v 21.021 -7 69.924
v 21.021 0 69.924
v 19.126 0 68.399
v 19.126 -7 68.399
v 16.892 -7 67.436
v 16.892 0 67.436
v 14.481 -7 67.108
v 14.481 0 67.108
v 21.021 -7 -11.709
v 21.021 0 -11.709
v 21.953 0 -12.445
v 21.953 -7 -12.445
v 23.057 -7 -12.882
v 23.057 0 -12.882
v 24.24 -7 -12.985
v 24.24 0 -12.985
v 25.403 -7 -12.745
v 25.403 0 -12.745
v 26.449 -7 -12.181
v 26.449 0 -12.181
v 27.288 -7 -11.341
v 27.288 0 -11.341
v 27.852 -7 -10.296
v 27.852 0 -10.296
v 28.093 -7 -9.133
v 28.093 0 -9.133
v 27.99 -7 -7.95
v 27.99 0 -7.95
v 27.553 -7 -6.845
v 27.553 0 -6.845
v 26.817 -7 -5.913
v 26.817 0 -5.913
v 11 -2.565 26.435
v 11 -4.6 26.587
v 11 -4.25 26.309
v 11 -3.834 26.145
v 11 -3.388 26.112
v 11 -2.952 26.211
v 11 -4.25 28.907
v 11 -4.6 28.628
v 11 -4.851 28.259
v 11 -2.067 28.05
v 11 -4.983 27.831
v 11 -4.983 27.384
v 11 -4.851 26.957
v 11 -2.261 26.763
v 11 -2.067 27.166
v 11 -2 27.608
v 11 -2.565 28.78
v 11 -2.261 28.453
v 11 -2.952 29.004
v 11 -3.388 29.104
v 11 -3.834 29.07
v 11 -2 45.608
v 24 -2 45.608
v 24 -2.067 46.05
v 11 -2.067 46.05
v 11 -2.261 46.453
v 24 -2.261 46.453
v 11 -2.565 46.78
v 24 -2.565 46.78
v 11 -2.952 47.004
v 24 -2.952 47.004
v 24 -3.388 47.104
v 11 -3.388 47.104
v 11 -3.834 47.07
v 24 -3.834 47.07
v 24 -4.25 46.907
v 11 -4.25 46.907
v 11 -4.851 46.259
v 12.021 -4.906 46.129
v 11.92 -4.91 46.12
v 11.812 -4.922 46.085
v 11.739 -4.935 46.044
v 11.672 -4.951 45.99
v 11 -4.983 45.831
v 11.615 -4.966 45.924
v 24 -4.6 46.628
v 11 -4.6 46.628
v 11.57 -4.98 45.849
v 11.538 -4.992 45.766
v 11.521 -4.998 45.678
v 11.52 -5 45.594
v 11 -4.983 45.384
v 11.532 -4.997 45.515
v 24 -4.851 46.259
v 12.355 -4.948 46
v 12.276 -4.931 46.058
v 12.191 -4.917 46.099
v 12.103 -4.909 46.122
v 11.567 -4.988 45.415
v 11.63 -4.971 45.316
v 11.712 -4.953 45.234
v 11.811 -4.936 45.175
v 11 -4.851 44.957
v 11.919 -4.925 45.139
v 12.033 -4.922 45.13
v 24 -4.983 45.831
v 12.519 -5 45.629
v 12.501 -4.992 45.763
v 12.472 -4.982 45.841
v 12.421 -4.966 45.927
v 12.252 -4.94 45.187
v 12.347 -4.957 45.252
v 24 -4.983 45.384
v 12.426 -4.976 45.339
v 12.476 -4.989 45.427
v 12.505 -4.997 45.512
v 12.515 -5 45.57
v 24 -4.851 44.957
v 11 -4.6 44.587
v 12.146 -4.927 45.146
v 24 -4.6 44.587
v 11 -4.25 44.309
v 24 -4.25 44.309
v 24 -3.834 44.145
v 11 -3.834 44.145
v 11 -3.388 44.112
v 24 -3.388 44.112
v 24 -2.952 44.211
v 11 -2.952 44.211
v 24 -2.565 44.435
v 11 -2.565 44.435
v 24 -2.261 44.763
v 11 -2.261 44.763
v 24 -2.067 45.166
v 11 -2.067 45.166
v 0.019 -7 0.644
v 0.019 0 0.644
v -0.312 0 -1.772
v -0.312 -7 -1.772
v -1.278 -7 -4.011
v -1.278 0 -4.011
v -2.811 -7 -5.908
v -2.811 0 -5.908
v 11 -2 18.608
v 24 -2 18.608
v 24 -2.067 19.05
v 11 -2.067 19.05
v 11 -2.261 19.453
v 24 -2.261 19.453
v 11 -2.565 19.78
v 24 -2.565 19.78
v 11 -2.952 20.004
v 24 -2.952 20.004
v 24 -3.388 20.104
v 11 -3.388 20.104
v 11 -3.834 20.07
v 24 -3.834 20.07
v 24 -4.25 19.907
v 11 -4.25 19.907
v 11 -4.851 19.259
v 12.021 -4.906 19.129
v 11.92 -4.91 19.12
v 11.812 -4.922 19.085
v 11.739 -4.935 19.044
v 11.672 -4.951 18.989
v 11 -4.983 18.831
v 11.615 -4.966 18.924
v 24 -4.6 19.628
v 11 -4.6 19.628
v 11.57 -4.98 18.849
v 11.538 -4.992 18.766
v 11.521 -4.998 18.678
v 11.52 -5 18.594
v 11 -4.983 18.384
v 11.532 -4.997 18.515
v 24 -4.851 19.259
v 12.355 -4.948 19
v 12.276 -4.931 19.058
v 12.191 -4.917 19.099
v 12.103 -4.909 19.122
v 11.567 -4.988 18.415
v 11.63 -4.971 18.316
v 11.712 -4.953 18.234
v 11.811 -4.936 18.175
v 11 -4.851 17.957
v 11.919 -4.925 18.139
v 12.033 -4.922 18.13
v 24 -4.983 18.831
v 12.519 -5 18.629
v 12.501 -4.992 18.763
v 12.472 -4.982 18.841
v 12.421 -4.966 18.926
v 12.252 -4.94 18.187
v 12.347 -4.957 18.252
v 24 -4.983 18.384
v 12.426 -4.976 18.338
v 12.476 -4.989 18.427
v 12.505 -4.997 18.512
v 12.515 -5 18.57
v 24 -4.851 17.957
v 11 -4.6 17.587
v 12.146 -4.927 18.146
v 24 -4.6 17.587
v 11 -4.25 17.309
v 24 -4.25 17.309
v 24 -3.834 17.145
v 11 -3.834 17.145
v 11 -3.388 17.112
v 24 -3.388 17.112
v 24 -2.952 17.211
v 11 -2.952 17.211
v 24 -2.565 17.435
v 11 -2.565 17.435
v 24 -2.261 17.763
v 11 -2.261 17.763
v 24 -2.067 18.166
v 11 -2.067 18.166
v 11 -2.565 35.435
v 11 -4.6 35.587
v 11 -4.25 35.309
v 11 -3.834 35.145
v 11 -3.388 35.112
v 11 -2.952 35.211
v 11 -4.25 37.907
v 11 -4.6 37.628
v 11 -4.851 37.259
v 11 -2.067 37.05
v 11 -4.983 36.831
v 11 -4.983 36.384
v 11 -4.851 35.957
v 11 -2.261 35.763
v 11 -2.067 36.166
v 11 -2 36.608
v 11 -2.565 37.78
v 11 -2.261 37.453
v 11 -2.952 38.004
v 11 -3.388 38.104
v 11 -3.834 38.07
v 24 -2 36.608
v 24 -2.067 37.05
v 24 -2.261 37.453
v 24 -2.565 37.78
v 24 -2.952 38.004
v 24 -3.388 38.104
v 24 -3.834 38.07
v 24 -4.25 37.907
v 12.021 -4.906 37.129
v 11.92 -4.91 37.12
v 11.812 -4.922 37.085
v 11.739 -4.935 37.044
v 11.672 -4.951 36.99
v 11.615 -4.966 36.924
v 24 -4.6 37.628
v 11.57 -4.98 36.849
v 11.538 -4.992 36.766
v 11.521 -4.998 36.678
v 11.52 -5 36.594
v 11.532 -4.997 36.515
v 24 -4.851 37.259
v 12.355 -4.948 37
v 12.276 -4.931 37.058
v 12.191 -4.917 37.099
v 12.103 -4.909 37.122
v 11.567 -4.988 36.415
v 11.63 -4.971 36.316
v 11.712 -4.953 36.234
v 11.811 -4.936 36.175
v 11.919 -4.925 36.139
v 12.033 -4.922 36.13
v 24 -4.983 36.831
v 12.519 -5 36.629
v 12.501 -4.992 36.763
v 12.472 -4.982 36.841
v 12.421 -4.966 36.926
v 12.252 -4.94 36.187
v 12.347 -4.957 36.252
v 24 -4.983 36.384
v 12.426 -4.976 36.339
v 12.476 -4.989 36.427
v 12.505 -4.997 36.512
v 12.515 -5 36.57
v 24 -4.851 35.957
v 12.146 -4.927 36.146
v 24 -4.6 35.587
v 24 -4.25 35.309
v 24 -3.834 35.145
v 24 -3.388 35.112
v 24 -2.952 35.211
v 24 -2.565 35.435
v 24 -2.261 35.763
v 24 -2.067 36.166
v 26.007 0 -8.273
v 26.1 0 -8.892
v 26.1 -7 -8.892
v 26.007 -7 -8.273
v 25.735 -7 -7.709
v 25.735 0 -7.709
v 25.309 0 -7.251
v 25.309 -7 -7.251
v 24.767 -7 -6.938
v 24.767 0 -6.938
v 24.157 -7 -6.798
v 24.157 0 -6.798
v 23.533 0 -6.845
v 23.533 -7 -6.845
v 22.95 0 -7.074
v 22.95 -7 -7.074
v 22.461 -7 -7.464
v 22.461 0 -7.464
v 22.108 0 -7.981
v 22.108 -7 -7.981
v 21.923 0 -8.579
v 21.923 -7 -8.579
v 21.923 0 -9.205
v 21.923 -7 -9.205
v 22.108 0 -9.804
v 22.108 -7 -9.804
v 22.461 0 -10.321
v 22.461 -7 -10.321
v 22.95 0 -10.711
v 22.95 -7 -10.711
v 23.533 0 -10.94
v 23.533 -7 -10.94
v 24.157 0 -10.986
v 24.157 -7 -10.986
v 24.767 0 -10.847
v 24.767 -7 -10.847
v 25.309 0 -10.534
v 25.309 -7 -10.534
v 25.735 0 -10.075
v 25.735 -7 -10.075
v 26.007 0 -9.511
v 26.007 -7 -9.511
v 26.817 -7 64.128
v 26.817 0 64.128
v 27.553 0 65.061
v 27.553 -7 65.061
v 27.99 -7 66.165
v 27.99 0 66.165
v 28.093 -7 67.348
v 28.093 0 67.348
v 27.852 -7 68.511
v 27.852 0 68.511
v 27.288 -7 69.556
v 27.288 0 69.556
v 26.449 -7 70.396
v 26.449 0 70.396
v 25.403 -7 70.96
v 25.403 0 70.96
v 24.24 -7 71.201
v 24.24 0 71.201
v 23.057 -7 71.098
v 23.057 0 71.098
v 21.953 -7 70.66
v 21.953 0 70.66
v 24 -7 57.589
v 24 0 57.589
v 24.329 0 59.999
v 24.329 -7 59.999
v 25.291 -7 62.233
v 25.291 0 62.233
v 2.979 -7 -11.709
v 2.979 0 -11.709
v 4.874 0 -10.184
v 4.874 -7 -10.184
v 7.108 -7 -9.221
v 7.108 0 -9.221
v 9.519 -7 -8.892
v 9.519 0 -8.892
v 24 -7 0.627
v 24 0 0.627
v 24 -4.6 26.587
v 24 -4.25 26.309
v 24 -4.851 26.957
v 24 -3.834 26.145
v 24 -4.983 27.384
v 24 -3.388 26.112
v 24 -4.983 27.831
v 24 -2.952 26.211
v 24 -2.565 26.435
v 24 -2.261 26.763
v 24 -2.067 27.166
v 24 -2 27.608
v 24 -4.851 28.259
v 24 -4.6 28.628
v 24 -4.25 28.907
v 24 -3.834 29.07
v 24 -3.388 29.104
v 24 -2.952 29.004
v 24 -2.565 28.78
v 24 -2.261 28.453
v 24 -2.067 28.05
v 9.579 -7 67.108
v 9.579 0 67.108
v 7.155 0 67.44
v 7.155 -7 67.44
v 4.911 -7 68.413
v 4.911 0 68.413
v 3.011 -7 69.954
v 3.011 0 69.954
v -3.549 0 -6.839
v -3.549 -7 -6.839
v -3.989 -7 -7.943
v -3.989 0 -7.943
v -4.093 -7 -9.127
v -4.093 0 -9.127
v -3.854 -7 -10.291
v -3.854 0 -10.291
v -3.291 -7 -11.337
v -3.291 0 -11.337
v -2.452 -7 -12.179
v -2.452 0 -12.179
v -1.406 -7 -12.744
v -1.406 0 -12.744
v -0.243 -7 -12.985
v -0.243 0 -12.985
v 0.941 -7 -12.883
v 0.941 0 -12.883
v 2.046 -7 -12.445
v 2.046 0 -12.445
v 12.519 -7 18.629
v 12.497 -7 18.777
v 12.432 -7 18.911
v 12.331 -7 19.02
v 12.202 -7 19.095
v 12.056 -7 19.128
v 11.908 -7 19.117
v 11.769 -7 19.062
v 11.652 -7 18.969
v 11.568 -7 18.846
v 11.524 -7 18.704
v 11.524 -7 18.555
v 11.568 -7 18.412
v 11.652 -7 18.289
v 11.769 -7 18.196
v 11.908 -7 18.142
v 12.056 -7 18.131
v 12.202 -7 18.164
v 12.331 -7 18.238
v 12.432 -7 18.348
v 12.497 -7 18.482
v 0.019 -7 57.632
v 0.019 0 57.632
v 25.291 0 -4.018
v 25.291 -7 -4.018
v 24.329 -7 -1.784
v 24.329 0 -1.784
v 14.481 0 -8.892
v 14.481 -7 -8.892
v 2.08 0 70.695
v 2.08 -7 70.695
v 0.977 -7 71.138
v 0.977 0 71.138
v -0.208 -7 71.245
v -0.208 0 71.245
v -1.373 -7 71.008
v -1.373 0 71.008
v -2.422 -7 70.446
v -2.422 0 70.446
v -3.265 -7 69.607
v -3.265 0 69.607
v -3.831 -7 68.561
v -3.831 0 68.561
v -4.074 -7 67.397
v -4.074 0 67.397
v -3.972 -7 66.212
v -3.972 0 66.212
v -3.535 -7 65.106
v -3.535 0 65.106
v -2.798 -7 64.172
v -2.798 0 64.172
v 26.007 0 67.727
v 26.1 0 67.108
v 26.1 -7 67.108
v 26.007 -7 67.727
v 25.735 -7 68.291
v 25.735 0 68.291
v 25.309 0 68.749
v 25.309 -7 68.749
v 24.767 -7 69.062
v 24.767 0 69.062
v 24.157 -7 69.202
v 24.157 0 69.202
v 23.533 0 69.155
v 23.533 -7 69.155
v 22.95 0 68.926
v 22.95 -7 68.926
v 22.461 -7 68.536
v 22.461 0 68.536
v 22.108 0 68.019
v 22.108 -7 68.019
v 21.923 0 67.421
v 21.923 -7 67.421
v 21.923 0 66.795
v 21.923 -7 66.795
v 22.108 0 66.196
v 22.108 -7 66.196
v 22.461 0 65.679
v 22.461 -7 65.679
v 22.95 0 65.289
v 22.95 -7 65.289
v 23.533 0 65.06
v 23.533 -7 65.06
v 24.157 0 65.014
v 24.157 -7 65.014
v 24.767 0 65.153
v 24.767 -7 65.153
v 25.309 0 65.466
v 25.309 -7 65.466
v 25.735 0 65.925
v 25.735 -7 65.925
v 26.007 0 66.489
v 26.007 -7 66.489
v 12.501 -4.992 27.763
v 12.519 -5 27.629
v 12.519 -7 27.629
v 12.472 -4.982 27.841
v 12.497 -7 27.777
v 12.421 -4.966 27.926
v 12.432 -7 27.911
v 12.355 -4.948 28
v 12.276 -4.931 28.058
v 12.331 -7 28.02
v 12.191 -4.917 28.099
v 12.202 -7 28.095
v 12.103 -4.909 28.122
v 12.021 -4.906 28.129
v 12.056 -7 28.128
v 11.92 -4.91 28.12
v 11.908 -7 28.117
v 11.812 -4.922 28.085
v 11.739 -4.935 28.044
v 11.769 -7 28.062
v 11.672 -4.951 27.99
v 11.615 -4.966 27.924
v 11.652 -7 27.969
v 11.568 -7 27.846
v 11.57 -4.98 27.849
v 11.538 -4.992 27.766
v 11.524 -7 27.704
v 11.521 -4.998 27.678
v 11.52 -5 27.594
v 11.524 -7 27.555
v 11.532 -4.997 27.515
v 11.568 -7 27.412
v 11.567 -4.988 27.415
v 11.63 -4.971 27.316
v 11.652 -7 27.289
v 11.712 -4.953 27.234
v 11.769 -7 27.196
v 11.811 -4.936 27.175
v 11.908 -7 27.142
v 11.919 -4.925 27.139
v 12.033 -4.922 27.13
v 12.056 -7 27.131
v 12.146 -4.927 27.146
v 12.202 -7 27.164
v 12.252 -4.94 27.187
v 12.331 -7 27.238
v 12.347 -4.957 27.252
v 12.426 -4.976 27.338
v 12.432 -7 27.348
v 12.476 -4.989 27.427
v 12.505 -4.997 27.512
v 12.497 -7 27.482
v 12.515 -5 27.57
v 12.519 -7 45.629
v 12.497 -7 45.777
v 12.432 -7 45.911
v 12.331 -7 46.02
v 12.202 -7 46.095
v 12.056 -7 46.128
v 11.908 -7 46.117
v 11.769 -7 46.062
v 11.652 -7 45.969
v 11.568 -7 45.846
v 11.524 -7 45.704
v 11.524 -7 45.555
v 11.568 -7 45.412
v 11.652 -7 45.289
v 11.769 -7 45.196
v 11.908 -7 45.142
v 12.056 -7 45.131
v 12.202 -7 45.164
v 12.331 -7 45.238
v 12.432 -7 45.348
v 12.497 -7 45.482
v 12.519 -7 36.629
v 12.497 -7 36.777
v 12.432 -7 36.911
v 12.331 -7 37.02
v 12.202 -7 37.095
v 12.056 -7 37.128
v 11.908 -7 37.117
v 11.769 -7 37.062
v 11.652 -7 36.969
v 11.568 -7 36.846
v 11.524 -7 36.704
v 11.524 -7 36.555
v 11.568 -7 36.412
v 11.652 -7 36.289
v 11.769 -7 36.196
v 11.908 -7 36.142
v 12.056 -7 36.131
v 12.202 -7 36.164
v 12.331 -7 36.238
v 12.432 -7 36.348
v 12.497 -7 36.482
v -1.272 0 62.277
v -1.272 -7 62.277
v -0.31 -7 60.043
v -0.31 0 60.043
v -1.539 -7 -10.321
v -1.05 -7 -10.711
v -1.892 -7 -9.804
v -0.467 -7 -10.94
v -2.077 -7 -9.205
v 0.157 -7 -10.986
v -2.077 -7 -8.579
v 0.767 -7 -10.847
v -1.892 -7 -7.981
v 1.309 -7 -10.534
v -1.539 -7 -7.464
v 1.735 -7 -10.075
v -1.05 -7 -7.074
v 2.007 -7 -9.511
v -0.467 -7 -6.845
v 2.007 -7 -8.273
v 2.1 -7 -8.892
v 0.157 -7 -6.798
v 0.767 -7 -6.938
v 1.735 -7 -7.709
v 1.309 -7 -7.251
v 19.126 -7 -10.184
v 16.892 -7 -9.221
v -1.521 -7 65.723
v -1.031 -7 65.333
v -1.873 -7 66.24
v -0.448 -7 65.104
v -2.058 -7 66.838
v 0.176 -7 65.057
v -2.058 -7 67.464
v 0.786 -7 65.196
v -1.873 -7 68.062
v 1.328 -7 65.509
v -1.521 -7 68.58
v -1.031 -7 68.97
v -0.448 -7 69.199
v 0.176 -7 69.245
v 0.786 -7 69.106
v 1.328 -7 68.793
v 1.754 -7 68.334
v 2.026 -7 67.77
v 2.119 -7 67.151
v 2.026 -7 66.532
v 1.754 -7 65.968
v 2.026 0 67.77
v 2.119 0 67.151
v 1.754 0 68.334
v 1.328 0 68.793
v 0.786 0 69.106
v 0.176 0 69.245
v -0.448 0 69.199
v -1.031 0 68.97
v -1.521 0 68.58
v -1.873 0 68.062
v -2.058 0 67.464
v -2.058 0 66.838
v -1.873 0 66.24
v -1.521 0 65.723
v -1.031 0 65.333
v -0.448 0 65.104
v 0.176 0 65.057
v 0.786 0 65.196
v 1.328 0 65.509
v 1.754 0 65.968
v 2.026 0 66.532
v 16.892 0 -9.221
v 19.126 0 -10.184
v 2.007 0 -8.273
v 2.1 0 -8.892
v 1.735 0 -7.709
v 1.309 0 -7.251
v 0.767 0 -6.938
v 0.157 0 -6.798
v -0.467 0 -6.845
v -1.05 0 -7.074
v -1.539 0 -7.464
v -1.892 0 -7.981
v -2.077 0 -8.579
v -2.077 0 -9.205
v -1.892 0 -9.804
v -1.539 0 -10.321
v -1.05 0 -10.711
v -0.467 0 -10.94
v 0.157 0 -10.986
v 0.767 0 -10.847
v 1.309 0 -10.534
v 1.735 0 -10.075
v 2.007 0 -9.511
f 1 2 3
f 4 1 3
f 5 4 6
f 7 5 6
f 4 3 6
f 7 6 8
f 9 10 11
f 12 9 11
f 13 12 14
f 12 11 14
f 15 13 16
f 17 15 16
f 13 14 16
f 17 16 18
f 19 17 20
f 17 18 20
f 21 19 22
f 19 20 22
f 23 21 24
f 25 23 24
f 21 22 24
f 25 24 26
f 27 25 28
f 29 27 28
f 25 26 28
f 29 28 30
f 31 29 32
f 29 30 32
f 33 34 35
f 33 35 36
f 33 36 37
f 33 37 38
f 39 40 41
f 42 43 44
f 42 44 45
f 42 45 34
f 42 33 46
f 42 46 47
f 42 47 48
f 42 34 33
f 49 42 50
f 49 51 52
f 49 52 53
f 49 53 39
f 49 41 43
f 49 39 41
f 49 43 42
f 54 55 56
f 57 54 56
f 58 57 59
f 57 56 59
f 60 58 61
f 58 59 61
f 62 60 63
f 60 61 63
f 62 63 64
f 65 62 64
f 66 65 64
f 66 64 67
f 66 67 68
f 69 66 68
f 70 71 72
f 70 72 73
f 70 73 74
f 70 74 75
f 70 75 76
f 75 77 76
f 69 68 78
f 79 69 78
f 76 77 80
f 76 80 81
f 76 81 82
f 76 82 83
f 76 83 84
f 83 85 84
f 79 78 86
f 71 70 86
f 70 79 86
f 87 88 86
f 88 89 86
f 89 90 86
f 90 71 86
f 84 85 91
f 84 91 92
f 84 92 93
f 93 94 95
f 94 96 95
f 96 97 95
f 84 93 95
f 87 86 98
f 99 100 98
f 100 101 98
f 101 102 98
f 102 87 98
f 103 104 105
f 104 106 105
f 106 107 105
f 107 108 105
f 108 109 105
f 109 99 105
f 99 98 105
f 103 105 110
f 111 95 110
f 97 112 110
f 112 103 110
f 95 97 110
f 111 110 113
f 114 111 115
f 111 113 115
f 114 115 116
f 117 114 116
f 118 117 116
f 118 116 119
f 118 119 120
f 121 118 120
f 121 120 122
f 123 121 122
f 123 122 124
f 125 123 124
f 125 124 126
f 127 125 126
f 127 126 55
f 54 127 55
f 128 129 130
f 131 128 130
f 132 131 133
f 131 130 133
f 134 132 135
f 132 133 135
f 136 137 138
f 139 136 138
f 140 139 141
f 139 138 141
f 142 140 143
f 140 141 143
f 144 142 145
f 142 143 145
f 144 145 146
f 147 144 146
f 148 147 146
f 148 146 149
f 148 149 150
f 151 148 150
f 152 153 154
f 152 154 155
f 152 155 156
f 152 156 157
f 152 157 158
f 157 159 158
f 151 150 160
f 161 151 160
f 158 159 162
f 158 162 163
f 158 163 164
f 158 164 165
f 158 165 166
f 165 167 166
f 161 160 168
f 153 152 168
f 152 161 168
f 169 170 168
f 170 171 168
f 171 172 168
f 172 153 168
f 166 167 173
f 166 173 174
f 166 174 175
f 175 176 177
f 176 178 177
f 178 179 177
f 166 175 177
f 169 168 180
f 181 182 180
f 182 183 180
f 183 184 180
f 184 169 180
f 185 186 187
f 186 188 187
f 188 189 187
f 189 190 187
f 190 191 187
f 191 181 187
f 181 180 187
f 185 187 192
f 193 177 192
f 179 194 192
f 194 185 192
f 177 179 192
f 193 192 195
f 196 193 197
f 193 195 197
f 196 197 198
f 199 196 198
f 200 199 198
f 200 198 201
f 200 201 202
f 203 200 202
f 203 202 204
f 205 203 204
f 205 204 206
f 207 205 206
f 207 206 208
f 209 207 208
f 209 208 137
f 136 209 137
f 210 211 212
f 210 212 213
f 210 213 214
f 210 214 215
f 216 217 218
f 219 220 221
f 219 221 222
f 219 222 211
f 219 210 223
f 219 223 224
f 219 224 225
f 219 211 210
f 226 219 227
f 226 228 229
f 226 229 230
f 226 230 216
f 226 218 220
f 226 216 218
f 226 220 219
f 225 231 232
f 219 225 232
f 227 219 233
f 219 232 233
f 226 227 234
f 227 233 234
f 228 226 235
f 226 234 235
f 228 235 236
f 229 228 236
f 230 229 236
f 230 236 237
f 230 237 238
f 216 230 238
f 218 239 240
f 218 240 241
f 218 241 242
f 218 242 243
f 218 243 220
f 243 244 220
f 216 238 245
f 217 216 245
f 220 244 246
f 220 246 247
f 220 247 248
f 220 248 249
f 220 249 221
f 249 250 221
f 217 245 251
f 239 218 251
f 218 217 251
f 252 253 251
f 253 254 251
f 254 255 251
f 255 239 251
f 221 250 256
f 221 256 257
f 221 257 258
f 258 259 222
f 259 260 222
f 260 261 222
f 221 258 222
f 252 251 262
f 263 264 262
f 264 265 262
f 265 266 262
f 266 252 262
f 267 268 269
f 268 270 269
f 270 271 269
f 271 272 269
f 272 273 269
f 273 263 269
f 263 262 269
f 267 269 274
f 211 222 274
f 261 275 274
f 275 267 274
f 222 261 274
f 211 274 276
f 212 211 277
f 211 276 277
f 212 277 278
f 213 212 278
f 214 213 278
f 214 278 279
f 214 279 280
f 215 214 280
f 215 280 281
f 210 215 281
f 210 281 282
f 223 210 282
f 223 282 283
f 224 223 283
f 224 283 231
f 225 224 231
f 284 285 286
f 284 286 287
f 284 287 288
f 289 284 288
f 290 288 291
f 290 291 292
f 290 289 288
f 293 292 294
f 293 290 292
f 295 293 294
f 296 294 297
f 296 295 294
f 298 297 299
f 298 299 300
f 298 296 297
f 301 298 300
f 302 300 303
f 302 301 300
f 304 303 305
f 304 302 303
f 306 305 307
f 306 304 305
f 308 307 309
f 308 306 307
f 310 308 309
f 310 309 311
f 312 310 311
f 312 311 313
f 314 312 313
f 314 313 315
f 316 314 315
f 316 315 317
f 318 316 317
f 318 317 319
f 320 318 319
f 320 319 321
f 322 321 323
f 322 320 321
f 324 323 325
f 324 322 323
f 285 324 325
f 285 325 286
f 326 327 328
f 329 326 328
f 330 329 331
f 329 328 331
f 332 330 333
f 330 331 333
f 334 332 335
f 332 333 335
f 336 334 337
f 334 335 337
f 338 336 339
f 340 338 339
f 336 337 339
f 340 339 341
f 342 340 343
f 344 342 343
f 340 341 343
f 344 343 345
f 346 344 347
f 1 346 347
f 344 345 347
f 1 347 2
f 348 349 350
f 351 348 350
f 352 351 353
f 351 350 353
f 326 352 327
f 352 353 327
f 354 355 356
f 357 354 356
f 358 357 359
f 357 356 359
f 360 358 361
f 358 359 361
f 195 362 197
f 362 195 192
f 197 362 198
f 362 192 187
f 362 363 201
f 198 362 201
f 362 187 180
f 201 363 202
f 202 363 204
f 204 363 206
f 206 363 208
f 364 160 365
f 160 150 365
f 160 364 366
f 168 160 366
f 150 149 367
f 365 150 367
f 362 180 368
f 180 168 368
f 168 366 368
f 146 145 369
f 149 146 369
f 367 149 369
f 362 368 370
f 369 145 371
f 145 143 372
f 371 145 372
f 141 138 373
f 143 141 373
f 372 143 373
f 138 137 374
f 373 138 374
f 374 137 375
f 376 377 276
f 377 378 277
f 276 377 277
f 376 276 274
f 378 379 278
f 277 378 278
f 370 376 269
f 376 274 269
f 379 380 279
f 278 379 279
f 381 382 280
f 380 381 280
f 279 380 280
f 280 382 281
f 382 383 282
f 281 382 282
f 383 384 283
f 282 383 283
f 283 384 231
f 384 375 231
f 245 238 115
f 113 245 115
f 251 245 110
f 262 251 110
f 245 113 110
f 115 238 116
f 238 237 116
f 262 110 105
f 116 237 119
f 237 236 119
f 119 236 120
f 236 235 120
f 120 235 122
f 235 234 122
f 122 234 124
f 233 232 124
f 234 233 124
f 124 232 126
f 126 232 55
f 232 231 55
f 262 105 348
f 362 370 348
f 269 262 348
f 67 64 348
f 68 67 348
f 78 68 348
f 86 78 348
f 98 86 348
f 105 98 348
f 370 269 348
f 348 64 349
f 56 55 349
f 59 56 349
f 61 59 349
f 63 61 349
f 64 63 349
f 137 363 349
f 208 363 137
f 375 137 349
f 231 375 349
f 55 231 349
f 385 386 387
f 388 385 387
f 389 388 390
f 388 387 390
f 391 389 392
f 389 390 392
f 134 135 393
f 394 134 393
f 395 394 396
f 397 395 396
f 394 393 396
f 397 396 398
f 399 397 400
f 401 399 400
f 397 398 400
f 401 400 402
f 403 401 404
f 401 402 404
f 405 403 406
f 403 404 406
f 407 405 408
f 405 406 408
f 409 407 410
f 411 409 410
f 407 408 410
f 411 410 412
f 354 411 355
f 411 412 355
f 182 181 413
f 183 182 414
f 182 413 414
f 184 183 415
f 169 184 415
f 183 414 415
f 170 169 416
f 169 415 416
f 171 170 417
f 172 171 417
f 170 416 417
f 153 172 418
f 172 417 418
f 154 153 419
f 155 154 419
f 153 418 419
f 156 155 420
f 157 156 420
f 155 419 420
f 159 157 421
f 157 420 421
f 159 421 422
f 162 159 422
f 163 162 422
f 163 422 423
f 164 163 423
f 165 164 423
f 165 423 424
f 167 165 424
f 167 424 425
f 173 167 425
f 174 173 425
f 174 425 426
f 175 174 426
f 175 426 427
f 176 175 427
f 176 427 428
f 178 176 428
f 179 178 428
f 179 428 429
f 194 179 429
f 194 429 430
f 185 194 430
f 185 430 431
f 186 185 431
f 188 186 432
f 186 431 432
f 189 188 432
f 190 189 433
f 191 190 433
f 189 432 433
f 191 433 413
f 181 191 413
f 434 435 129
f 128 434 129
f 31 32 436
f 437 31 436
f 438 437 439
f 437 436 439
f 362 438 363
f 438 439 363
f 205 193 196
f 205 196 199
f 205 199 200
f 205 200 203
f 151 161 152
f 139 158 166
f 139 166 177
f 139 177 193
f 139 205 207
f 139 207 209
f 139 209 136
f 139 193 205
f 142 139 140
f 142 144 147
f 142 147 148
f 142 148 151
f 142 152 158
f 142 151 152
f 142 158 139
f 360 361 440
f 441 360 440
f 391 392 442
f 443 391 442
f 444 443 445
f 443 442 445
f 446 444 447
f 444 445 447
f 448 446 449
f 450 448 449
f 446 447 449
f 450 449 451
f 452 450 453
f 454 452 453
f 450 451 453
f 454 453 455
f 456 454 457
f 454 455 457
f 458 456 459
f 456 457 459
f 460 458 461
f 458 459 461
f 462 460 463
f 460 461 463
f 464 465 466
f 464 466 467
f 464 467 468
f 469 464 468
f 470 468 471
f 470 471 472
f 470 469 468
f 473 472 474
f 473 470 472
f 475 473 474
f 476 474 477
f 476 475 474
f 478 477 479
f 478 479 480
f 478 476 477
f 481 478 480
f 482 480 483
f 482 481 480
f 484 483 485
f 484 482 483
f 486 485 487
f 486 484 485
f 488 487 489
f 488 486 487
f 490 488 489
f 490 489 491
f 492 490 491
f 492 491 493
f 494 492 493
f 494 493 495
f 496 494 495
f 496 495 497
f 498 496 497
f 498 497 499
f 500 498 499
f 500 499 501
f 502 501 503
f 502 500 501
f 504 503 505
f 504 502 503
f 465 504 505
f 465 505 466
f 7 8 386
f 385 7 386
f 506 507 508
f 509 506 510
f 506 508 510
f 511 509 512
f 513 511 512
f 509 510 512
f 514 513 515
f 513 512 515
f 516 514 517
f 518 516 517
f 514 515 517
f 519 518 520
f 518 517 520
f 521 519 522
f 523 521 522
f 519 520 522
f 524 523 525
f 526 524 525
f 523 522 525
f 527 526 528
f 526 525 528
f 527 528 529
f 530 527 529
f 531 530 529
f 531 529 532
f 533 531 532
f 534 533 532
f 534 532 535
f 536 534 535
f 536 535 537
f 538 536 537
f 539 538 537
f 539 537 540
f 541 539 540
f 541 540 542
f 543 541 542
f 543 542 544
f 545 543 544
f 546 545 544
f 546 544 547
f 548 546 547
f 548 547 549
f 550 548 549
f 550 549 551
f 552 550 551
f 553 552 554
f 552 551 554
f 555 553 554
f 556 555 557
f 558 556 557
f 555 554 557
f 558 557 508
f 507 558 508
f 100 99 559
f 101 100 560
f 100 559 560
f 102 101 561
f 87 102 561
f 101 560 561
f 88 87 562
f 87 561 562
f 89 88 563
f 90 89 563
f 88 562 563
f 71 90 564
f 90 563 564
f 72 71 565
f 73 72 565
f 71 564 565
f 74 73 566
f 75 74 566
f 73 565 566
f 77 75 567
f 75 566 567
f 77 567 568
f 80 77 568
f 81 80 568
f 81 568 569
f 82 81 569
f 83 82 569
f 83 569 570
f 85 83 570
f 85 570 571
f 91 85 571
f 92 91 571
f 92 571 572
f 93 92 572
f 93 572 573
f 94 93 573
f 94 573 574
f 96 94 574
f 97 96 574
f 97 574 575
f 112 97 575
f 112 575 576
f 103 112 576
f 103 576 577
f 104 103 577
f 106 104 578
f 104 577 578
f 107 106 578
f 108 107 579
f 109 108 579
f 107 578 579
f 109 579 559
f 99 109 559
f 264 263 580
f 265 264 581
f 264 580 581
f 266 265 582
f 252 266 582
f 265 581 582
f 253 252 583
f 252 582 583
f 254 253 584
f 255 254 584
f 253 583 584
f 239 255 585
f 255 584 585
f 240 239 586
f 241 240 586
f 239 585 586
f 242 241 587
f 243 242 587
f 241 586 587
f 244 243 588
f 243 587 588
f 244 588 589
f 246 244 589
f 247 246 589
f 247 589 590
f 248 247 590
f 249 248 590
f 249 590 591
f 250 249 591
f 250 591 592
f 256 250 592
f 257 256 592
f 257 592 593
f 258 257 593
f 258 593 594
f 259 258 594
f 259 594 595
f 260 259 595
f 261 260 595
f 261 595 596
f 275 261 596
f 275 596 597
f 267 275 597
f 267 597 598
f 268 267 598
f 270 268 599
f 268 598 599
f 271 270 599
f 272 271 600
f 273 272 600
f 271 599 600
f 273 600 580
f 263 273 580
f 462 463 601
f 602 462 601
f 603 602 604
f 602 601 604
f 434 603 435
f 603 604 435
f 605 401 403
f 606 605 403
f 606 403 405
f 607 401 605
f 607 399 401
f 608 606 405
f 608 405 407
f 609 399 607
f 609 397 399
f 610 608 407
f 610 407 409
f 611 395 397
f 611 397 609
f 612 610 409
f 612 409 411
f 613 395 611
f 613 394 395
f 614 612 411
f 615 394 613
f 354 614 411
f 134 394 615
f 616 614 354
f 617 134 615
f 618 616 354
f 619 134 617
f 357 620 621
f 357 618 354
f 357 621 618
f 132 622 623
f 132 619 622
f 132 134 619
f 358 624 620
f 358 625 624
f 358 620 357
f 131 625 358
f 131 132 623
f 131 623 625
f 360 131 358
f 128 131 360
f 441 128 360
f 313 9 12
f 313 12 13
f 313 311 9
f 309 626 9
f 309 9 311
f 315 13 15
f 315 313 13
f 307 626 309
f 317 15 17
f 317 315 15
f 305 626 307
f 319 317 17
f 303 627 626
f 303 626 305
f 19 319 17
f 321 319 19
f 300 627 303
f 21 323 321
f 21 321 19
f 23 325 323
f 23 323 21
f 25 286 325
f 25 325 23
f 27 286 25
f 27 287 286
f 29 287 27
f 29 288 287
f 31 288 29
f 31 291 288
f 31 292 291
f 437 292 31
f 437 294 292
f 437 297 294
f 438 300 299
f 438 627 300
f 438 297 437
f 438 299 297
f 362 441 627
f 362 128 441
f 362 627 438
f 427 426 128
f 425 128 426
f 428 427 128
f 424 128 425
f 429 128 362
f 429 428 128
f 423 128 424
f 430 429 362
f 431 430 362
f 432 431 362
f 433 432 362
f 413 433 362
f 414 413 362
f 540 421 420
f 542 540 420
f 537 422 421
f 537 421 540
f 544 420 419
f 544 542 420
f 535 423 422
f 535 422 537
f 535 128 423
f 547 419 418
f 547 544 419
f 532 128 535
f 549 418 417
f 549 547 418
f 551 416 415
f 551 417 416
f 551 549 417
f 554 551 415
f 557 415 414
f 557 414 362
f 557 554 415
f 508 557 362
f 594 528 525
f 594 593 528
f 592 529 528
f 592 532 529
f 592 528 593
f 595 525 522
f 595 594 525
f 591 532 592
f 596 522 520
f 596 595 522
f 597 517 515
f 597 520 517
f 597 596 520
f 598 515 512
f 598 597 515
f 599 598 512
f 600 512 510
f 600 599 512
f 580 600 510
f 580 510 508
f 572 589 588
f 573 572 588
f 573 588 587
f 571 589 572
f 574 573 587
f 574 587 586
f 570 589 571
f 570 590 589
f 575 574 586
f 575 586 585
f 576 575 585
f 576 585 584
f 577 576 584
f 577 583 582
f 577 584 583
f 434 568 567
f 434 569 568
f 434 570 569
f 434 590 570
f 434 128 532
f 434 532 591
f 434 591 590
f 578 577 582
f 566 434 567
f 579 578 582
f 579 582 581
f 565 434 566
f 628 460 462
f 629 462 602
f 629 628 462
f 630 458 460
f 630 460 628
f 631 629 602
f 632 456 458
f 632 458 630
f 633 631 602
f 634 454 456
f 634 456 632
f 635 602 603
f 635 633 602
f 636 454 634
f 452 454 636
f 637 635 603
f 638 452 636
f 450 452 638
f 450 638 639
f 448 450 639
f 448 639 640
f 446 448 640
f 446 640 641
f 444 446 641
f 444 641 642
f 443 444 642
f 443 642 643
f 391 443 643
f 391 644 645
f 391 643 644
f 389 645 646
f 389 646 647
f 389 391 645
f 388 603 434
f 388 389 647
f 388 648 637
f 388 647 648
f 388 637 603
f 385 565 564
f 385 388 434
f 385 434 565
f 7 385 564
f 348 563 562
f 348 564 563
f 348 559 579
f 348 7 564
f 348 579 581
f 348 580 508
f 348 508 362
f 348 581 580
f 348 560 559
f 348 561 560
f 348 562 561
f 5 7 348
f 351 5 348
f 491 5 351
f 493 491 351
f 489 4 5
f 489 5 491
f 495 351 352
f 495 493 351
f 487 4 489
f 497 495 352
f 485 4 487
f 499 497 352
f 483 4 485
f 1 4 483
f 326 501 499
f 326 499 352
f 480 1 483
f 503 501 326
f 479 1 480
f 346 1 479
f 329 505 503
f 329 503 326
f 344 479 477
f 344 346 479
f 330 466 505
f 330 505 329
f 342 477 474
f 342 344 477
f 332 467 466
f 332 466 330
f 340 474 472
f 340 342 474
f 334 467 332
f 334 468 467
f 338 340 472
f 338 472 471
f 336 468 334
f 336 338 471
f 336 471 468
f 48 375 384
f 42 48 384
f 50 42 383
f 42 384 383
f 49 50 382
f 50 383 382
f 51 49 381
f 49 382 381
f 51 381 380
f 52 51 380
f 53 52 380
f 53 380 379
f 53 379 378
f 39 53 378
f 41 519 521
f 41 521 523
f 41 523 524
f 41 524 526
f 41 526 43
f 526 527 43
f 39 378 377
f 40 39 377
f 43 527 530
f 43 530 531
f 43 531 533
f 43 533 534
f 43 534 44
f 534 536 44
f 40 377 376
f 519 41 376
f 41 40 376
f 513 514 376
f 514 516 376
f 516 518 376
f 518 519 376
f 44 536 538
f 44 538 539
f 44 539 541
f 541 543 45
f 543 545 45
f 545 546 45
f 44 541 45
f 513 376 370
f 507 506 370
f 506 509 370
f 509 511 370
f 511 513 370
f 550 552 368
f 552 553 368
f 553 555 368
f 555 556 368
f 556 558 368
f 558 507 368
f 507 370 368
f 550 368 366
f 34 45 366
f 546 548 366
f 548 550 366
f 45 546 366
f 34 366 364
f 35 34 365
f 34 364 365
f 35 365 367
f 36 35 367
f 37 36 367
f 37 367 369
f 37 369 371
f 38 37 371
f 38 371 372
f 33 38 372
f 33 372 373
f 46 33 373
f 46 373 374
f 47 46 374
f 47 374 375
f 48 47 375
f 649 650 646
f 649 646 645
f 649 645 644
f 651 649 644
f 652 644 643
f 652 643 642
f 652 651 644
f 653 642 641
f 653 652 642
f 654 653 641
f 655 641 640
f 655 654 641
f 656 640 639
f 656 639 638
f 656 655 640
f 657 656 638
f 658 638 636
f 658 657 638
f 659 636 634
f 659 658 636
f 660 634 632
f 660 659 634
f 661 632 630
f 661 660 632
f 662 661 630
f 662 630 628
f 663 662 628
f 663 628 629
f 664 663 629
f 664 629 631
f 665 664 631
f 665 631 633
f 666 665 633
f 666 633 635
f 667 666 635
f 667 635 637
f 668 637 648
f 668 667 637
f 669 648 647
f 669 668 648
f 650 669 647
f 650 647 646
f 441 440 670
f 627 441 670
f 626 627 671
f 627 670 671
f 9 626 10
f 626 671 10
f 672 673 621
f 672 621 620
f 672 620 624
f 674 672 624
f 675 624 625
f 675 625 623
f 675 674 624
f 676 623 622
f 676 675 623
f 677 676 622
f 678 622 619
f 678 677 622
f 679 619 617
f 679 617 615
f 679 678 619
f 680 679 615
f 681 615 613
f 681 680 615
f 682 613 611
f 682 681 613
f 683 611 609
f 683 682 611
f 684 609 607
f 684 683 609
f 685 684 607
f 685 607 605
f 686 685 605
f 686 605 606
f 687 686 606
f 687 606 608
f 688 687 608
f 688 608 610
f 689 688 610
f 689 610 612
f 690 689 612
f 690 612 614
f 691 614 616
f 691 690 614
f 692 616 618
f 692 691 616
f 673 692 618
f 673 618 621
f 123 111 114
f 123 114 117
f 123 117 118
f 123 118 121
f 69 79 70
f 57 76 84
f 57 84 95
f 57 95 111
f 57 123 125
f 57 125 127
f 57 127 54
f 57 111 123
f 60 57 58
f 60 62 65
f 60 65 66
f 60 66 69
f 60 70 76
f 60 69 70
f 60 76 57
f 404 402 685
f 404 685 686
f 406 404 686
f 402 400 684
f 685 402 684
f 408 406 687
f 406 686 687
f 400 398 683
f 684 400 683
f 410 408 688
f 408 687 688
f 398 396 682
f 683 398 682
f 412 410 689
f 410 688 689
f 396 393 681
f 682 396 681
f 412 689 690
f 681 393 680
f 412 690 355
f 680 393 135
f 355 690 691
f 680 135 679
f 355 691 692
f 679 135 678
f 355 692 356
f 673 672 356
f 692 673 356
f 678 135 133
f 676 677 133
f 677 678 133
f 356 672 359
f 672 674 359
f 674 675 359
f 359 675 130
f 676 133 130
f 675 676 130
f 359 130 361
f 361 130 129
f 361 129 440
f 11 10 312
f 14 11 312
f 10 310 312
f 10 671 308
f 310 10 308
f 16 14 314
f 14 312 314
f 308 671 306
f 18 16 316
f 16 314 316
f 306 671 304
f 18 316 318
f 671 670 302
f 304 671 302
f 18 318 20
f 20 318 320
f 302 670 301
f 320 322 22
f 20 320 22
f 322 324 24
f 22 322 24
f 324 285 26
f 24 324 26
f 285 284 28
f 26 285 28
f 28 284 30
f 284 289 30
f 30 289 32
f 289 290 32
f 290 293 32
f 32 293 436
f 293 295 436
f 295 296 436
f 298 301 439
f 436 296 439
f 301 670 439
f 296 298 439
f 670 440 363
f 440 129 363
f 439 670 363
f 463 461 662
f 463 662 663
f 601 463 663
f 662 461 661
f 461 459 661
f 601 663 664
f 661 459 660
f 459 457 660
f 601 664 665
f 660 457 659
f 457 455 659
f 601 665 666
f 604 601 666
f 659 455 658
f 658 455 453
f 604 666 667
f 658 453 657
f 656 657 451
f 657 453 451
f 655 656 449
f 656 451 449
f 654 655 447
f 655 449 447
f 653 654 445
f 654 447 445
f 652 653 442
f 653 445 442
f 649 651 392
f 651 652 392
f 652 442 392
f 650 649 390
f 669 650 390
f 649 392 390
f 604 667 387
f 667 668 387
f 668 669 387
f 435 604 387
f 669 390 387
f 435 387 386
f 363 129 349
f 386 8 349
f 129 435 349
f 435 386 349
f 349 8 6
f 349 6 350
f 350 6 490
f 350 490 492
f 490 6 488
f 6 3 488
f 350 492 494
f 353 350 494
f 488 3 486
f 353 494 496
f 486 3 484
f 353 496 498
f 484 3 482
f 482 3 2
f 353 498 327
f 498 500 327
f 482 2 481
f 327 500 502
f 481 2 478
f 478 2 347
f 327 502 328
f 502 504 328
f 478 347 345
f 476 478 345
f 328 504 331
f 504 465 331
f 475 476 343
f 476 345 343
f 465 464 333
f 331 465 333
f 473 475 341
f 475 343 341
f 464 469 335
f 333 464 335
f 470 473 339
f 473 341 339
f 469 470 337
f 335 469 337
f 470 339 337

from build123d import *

# Parameters (mm, degrees)
F0_R     = 2.1
F1_DEPTH = 7
F2_R     = 0.5
F3_DEPTH = 4
F4_R     = 1.5
F5_DEPTH = 13


with BuildPart() as f1:
    # F0 (on Front) → F1 (new body)
    with BuildSketch(Plane.XZ):
        with BuildLine():
            ThreePointArc((2.979207, -11.709161), (5.958651, -9.626508), (9.518929, -8.892367))
            Line((9.518929, -8.892367), (14.481071, -8.892367))
            ThreePointArc((14.481071, -8.892367), (18.041349, -9.626508), (21.020793, -11.709161))
            ThreePointArc((21.020793, -11.709161), (26.899138, -11.791505), (26.816794, -5.913161))
            ThreePointArc((26.816794, -5.913161), (24.734141, -2.933716), (24, 0.626561))
            Line((24, 0.626561), (24, 57.588704))
            ThreePointArc((24, 57.588704), (24.734141, 61.148981), (26.816794, 64.128426))
            ThreePointArc((26.816794, 64.128426), (26.899138, 70.006771), (21.020793, 69.924427))
            ThreePointArc((21.020793, 69.924427), (18.041349, 67.841774), (14.481071, 67.107633))
            Line((14.481071, 67.107633), (9.578815, 67.107633))
            ThreePointArc((9.578815, 67.107633), (5.999651, 67.849934), (3.010891, 69.954391))
            ThreePointArc((3.010891, 69.954391), (-2.873666, 70.057006), (-2.797957, 64.172041))
            ThreePointArc((-2.797957, 64.172041), (-0.715304, 61.192596), (0.018837, 57.632319))
            Line((0.018837, 57.632319), (0.018837, 0.644336))
            ThreePointArc((0.018837, 0.644336), (-0.718827, -2.92411), (-2.810898, -5.907597))
            ThreePointArc((-2.810898, -5.907597), (-2.902002, -11.788638), (2.979207, -11.709161))
        make_face()
        with Locations((0, -8.892367)):
            Circle(F0_R, mode=Mode.SUBTRACT)
        with Locations((24, -8.892367)):
            Circle(F0_R, mode=Mode.SUBTRACT)
        with Locations((0.018837, 67.151248)):
            Circle(F0_R, mode=Mode.SUBTRACT)
        with Locations((24, 67.107633)):
            Circle(F0_R, mode=Mode.SUBTRACT)
    extrude(amount=F1_DEPTH)

    # F2 (on face) → F3 (cut)
    with BuildSketch(Plane.XZ.offset(7)):
        with Locations((12.018837, 45.629388)):
            Circle(F2_R)
        with Locations((12.018837, 36.629373)):
            Circle(F2_R)
        with Locations((12.018837, 27.629358)):
            Circle(F2_R)
        with Locations((12.018837, 18.629343)):
            Circle(F2_R)
    extrude(amount=-F3_DEPTH, mode=Mode.SUBTRACT)

    # F4 (on face) → F5 (cut)
    with BuildSketch(Plane.YZ.offset(24)):
        with Locations((-3.5, 45.607704)):
            Circle(F4_R)
        with Locations((-3.5, 36.607704)):
            Circle(F4_R)
        with Locations((-3.5, 27.607704)):
            Circle(F4_R)
        with Locations((-3.5, 18.607704)):
            Circle(F4_R)
    extrude(amount=-F5_DEPTH, mode=Mode.SUBTRACT)


solid = f1.part
